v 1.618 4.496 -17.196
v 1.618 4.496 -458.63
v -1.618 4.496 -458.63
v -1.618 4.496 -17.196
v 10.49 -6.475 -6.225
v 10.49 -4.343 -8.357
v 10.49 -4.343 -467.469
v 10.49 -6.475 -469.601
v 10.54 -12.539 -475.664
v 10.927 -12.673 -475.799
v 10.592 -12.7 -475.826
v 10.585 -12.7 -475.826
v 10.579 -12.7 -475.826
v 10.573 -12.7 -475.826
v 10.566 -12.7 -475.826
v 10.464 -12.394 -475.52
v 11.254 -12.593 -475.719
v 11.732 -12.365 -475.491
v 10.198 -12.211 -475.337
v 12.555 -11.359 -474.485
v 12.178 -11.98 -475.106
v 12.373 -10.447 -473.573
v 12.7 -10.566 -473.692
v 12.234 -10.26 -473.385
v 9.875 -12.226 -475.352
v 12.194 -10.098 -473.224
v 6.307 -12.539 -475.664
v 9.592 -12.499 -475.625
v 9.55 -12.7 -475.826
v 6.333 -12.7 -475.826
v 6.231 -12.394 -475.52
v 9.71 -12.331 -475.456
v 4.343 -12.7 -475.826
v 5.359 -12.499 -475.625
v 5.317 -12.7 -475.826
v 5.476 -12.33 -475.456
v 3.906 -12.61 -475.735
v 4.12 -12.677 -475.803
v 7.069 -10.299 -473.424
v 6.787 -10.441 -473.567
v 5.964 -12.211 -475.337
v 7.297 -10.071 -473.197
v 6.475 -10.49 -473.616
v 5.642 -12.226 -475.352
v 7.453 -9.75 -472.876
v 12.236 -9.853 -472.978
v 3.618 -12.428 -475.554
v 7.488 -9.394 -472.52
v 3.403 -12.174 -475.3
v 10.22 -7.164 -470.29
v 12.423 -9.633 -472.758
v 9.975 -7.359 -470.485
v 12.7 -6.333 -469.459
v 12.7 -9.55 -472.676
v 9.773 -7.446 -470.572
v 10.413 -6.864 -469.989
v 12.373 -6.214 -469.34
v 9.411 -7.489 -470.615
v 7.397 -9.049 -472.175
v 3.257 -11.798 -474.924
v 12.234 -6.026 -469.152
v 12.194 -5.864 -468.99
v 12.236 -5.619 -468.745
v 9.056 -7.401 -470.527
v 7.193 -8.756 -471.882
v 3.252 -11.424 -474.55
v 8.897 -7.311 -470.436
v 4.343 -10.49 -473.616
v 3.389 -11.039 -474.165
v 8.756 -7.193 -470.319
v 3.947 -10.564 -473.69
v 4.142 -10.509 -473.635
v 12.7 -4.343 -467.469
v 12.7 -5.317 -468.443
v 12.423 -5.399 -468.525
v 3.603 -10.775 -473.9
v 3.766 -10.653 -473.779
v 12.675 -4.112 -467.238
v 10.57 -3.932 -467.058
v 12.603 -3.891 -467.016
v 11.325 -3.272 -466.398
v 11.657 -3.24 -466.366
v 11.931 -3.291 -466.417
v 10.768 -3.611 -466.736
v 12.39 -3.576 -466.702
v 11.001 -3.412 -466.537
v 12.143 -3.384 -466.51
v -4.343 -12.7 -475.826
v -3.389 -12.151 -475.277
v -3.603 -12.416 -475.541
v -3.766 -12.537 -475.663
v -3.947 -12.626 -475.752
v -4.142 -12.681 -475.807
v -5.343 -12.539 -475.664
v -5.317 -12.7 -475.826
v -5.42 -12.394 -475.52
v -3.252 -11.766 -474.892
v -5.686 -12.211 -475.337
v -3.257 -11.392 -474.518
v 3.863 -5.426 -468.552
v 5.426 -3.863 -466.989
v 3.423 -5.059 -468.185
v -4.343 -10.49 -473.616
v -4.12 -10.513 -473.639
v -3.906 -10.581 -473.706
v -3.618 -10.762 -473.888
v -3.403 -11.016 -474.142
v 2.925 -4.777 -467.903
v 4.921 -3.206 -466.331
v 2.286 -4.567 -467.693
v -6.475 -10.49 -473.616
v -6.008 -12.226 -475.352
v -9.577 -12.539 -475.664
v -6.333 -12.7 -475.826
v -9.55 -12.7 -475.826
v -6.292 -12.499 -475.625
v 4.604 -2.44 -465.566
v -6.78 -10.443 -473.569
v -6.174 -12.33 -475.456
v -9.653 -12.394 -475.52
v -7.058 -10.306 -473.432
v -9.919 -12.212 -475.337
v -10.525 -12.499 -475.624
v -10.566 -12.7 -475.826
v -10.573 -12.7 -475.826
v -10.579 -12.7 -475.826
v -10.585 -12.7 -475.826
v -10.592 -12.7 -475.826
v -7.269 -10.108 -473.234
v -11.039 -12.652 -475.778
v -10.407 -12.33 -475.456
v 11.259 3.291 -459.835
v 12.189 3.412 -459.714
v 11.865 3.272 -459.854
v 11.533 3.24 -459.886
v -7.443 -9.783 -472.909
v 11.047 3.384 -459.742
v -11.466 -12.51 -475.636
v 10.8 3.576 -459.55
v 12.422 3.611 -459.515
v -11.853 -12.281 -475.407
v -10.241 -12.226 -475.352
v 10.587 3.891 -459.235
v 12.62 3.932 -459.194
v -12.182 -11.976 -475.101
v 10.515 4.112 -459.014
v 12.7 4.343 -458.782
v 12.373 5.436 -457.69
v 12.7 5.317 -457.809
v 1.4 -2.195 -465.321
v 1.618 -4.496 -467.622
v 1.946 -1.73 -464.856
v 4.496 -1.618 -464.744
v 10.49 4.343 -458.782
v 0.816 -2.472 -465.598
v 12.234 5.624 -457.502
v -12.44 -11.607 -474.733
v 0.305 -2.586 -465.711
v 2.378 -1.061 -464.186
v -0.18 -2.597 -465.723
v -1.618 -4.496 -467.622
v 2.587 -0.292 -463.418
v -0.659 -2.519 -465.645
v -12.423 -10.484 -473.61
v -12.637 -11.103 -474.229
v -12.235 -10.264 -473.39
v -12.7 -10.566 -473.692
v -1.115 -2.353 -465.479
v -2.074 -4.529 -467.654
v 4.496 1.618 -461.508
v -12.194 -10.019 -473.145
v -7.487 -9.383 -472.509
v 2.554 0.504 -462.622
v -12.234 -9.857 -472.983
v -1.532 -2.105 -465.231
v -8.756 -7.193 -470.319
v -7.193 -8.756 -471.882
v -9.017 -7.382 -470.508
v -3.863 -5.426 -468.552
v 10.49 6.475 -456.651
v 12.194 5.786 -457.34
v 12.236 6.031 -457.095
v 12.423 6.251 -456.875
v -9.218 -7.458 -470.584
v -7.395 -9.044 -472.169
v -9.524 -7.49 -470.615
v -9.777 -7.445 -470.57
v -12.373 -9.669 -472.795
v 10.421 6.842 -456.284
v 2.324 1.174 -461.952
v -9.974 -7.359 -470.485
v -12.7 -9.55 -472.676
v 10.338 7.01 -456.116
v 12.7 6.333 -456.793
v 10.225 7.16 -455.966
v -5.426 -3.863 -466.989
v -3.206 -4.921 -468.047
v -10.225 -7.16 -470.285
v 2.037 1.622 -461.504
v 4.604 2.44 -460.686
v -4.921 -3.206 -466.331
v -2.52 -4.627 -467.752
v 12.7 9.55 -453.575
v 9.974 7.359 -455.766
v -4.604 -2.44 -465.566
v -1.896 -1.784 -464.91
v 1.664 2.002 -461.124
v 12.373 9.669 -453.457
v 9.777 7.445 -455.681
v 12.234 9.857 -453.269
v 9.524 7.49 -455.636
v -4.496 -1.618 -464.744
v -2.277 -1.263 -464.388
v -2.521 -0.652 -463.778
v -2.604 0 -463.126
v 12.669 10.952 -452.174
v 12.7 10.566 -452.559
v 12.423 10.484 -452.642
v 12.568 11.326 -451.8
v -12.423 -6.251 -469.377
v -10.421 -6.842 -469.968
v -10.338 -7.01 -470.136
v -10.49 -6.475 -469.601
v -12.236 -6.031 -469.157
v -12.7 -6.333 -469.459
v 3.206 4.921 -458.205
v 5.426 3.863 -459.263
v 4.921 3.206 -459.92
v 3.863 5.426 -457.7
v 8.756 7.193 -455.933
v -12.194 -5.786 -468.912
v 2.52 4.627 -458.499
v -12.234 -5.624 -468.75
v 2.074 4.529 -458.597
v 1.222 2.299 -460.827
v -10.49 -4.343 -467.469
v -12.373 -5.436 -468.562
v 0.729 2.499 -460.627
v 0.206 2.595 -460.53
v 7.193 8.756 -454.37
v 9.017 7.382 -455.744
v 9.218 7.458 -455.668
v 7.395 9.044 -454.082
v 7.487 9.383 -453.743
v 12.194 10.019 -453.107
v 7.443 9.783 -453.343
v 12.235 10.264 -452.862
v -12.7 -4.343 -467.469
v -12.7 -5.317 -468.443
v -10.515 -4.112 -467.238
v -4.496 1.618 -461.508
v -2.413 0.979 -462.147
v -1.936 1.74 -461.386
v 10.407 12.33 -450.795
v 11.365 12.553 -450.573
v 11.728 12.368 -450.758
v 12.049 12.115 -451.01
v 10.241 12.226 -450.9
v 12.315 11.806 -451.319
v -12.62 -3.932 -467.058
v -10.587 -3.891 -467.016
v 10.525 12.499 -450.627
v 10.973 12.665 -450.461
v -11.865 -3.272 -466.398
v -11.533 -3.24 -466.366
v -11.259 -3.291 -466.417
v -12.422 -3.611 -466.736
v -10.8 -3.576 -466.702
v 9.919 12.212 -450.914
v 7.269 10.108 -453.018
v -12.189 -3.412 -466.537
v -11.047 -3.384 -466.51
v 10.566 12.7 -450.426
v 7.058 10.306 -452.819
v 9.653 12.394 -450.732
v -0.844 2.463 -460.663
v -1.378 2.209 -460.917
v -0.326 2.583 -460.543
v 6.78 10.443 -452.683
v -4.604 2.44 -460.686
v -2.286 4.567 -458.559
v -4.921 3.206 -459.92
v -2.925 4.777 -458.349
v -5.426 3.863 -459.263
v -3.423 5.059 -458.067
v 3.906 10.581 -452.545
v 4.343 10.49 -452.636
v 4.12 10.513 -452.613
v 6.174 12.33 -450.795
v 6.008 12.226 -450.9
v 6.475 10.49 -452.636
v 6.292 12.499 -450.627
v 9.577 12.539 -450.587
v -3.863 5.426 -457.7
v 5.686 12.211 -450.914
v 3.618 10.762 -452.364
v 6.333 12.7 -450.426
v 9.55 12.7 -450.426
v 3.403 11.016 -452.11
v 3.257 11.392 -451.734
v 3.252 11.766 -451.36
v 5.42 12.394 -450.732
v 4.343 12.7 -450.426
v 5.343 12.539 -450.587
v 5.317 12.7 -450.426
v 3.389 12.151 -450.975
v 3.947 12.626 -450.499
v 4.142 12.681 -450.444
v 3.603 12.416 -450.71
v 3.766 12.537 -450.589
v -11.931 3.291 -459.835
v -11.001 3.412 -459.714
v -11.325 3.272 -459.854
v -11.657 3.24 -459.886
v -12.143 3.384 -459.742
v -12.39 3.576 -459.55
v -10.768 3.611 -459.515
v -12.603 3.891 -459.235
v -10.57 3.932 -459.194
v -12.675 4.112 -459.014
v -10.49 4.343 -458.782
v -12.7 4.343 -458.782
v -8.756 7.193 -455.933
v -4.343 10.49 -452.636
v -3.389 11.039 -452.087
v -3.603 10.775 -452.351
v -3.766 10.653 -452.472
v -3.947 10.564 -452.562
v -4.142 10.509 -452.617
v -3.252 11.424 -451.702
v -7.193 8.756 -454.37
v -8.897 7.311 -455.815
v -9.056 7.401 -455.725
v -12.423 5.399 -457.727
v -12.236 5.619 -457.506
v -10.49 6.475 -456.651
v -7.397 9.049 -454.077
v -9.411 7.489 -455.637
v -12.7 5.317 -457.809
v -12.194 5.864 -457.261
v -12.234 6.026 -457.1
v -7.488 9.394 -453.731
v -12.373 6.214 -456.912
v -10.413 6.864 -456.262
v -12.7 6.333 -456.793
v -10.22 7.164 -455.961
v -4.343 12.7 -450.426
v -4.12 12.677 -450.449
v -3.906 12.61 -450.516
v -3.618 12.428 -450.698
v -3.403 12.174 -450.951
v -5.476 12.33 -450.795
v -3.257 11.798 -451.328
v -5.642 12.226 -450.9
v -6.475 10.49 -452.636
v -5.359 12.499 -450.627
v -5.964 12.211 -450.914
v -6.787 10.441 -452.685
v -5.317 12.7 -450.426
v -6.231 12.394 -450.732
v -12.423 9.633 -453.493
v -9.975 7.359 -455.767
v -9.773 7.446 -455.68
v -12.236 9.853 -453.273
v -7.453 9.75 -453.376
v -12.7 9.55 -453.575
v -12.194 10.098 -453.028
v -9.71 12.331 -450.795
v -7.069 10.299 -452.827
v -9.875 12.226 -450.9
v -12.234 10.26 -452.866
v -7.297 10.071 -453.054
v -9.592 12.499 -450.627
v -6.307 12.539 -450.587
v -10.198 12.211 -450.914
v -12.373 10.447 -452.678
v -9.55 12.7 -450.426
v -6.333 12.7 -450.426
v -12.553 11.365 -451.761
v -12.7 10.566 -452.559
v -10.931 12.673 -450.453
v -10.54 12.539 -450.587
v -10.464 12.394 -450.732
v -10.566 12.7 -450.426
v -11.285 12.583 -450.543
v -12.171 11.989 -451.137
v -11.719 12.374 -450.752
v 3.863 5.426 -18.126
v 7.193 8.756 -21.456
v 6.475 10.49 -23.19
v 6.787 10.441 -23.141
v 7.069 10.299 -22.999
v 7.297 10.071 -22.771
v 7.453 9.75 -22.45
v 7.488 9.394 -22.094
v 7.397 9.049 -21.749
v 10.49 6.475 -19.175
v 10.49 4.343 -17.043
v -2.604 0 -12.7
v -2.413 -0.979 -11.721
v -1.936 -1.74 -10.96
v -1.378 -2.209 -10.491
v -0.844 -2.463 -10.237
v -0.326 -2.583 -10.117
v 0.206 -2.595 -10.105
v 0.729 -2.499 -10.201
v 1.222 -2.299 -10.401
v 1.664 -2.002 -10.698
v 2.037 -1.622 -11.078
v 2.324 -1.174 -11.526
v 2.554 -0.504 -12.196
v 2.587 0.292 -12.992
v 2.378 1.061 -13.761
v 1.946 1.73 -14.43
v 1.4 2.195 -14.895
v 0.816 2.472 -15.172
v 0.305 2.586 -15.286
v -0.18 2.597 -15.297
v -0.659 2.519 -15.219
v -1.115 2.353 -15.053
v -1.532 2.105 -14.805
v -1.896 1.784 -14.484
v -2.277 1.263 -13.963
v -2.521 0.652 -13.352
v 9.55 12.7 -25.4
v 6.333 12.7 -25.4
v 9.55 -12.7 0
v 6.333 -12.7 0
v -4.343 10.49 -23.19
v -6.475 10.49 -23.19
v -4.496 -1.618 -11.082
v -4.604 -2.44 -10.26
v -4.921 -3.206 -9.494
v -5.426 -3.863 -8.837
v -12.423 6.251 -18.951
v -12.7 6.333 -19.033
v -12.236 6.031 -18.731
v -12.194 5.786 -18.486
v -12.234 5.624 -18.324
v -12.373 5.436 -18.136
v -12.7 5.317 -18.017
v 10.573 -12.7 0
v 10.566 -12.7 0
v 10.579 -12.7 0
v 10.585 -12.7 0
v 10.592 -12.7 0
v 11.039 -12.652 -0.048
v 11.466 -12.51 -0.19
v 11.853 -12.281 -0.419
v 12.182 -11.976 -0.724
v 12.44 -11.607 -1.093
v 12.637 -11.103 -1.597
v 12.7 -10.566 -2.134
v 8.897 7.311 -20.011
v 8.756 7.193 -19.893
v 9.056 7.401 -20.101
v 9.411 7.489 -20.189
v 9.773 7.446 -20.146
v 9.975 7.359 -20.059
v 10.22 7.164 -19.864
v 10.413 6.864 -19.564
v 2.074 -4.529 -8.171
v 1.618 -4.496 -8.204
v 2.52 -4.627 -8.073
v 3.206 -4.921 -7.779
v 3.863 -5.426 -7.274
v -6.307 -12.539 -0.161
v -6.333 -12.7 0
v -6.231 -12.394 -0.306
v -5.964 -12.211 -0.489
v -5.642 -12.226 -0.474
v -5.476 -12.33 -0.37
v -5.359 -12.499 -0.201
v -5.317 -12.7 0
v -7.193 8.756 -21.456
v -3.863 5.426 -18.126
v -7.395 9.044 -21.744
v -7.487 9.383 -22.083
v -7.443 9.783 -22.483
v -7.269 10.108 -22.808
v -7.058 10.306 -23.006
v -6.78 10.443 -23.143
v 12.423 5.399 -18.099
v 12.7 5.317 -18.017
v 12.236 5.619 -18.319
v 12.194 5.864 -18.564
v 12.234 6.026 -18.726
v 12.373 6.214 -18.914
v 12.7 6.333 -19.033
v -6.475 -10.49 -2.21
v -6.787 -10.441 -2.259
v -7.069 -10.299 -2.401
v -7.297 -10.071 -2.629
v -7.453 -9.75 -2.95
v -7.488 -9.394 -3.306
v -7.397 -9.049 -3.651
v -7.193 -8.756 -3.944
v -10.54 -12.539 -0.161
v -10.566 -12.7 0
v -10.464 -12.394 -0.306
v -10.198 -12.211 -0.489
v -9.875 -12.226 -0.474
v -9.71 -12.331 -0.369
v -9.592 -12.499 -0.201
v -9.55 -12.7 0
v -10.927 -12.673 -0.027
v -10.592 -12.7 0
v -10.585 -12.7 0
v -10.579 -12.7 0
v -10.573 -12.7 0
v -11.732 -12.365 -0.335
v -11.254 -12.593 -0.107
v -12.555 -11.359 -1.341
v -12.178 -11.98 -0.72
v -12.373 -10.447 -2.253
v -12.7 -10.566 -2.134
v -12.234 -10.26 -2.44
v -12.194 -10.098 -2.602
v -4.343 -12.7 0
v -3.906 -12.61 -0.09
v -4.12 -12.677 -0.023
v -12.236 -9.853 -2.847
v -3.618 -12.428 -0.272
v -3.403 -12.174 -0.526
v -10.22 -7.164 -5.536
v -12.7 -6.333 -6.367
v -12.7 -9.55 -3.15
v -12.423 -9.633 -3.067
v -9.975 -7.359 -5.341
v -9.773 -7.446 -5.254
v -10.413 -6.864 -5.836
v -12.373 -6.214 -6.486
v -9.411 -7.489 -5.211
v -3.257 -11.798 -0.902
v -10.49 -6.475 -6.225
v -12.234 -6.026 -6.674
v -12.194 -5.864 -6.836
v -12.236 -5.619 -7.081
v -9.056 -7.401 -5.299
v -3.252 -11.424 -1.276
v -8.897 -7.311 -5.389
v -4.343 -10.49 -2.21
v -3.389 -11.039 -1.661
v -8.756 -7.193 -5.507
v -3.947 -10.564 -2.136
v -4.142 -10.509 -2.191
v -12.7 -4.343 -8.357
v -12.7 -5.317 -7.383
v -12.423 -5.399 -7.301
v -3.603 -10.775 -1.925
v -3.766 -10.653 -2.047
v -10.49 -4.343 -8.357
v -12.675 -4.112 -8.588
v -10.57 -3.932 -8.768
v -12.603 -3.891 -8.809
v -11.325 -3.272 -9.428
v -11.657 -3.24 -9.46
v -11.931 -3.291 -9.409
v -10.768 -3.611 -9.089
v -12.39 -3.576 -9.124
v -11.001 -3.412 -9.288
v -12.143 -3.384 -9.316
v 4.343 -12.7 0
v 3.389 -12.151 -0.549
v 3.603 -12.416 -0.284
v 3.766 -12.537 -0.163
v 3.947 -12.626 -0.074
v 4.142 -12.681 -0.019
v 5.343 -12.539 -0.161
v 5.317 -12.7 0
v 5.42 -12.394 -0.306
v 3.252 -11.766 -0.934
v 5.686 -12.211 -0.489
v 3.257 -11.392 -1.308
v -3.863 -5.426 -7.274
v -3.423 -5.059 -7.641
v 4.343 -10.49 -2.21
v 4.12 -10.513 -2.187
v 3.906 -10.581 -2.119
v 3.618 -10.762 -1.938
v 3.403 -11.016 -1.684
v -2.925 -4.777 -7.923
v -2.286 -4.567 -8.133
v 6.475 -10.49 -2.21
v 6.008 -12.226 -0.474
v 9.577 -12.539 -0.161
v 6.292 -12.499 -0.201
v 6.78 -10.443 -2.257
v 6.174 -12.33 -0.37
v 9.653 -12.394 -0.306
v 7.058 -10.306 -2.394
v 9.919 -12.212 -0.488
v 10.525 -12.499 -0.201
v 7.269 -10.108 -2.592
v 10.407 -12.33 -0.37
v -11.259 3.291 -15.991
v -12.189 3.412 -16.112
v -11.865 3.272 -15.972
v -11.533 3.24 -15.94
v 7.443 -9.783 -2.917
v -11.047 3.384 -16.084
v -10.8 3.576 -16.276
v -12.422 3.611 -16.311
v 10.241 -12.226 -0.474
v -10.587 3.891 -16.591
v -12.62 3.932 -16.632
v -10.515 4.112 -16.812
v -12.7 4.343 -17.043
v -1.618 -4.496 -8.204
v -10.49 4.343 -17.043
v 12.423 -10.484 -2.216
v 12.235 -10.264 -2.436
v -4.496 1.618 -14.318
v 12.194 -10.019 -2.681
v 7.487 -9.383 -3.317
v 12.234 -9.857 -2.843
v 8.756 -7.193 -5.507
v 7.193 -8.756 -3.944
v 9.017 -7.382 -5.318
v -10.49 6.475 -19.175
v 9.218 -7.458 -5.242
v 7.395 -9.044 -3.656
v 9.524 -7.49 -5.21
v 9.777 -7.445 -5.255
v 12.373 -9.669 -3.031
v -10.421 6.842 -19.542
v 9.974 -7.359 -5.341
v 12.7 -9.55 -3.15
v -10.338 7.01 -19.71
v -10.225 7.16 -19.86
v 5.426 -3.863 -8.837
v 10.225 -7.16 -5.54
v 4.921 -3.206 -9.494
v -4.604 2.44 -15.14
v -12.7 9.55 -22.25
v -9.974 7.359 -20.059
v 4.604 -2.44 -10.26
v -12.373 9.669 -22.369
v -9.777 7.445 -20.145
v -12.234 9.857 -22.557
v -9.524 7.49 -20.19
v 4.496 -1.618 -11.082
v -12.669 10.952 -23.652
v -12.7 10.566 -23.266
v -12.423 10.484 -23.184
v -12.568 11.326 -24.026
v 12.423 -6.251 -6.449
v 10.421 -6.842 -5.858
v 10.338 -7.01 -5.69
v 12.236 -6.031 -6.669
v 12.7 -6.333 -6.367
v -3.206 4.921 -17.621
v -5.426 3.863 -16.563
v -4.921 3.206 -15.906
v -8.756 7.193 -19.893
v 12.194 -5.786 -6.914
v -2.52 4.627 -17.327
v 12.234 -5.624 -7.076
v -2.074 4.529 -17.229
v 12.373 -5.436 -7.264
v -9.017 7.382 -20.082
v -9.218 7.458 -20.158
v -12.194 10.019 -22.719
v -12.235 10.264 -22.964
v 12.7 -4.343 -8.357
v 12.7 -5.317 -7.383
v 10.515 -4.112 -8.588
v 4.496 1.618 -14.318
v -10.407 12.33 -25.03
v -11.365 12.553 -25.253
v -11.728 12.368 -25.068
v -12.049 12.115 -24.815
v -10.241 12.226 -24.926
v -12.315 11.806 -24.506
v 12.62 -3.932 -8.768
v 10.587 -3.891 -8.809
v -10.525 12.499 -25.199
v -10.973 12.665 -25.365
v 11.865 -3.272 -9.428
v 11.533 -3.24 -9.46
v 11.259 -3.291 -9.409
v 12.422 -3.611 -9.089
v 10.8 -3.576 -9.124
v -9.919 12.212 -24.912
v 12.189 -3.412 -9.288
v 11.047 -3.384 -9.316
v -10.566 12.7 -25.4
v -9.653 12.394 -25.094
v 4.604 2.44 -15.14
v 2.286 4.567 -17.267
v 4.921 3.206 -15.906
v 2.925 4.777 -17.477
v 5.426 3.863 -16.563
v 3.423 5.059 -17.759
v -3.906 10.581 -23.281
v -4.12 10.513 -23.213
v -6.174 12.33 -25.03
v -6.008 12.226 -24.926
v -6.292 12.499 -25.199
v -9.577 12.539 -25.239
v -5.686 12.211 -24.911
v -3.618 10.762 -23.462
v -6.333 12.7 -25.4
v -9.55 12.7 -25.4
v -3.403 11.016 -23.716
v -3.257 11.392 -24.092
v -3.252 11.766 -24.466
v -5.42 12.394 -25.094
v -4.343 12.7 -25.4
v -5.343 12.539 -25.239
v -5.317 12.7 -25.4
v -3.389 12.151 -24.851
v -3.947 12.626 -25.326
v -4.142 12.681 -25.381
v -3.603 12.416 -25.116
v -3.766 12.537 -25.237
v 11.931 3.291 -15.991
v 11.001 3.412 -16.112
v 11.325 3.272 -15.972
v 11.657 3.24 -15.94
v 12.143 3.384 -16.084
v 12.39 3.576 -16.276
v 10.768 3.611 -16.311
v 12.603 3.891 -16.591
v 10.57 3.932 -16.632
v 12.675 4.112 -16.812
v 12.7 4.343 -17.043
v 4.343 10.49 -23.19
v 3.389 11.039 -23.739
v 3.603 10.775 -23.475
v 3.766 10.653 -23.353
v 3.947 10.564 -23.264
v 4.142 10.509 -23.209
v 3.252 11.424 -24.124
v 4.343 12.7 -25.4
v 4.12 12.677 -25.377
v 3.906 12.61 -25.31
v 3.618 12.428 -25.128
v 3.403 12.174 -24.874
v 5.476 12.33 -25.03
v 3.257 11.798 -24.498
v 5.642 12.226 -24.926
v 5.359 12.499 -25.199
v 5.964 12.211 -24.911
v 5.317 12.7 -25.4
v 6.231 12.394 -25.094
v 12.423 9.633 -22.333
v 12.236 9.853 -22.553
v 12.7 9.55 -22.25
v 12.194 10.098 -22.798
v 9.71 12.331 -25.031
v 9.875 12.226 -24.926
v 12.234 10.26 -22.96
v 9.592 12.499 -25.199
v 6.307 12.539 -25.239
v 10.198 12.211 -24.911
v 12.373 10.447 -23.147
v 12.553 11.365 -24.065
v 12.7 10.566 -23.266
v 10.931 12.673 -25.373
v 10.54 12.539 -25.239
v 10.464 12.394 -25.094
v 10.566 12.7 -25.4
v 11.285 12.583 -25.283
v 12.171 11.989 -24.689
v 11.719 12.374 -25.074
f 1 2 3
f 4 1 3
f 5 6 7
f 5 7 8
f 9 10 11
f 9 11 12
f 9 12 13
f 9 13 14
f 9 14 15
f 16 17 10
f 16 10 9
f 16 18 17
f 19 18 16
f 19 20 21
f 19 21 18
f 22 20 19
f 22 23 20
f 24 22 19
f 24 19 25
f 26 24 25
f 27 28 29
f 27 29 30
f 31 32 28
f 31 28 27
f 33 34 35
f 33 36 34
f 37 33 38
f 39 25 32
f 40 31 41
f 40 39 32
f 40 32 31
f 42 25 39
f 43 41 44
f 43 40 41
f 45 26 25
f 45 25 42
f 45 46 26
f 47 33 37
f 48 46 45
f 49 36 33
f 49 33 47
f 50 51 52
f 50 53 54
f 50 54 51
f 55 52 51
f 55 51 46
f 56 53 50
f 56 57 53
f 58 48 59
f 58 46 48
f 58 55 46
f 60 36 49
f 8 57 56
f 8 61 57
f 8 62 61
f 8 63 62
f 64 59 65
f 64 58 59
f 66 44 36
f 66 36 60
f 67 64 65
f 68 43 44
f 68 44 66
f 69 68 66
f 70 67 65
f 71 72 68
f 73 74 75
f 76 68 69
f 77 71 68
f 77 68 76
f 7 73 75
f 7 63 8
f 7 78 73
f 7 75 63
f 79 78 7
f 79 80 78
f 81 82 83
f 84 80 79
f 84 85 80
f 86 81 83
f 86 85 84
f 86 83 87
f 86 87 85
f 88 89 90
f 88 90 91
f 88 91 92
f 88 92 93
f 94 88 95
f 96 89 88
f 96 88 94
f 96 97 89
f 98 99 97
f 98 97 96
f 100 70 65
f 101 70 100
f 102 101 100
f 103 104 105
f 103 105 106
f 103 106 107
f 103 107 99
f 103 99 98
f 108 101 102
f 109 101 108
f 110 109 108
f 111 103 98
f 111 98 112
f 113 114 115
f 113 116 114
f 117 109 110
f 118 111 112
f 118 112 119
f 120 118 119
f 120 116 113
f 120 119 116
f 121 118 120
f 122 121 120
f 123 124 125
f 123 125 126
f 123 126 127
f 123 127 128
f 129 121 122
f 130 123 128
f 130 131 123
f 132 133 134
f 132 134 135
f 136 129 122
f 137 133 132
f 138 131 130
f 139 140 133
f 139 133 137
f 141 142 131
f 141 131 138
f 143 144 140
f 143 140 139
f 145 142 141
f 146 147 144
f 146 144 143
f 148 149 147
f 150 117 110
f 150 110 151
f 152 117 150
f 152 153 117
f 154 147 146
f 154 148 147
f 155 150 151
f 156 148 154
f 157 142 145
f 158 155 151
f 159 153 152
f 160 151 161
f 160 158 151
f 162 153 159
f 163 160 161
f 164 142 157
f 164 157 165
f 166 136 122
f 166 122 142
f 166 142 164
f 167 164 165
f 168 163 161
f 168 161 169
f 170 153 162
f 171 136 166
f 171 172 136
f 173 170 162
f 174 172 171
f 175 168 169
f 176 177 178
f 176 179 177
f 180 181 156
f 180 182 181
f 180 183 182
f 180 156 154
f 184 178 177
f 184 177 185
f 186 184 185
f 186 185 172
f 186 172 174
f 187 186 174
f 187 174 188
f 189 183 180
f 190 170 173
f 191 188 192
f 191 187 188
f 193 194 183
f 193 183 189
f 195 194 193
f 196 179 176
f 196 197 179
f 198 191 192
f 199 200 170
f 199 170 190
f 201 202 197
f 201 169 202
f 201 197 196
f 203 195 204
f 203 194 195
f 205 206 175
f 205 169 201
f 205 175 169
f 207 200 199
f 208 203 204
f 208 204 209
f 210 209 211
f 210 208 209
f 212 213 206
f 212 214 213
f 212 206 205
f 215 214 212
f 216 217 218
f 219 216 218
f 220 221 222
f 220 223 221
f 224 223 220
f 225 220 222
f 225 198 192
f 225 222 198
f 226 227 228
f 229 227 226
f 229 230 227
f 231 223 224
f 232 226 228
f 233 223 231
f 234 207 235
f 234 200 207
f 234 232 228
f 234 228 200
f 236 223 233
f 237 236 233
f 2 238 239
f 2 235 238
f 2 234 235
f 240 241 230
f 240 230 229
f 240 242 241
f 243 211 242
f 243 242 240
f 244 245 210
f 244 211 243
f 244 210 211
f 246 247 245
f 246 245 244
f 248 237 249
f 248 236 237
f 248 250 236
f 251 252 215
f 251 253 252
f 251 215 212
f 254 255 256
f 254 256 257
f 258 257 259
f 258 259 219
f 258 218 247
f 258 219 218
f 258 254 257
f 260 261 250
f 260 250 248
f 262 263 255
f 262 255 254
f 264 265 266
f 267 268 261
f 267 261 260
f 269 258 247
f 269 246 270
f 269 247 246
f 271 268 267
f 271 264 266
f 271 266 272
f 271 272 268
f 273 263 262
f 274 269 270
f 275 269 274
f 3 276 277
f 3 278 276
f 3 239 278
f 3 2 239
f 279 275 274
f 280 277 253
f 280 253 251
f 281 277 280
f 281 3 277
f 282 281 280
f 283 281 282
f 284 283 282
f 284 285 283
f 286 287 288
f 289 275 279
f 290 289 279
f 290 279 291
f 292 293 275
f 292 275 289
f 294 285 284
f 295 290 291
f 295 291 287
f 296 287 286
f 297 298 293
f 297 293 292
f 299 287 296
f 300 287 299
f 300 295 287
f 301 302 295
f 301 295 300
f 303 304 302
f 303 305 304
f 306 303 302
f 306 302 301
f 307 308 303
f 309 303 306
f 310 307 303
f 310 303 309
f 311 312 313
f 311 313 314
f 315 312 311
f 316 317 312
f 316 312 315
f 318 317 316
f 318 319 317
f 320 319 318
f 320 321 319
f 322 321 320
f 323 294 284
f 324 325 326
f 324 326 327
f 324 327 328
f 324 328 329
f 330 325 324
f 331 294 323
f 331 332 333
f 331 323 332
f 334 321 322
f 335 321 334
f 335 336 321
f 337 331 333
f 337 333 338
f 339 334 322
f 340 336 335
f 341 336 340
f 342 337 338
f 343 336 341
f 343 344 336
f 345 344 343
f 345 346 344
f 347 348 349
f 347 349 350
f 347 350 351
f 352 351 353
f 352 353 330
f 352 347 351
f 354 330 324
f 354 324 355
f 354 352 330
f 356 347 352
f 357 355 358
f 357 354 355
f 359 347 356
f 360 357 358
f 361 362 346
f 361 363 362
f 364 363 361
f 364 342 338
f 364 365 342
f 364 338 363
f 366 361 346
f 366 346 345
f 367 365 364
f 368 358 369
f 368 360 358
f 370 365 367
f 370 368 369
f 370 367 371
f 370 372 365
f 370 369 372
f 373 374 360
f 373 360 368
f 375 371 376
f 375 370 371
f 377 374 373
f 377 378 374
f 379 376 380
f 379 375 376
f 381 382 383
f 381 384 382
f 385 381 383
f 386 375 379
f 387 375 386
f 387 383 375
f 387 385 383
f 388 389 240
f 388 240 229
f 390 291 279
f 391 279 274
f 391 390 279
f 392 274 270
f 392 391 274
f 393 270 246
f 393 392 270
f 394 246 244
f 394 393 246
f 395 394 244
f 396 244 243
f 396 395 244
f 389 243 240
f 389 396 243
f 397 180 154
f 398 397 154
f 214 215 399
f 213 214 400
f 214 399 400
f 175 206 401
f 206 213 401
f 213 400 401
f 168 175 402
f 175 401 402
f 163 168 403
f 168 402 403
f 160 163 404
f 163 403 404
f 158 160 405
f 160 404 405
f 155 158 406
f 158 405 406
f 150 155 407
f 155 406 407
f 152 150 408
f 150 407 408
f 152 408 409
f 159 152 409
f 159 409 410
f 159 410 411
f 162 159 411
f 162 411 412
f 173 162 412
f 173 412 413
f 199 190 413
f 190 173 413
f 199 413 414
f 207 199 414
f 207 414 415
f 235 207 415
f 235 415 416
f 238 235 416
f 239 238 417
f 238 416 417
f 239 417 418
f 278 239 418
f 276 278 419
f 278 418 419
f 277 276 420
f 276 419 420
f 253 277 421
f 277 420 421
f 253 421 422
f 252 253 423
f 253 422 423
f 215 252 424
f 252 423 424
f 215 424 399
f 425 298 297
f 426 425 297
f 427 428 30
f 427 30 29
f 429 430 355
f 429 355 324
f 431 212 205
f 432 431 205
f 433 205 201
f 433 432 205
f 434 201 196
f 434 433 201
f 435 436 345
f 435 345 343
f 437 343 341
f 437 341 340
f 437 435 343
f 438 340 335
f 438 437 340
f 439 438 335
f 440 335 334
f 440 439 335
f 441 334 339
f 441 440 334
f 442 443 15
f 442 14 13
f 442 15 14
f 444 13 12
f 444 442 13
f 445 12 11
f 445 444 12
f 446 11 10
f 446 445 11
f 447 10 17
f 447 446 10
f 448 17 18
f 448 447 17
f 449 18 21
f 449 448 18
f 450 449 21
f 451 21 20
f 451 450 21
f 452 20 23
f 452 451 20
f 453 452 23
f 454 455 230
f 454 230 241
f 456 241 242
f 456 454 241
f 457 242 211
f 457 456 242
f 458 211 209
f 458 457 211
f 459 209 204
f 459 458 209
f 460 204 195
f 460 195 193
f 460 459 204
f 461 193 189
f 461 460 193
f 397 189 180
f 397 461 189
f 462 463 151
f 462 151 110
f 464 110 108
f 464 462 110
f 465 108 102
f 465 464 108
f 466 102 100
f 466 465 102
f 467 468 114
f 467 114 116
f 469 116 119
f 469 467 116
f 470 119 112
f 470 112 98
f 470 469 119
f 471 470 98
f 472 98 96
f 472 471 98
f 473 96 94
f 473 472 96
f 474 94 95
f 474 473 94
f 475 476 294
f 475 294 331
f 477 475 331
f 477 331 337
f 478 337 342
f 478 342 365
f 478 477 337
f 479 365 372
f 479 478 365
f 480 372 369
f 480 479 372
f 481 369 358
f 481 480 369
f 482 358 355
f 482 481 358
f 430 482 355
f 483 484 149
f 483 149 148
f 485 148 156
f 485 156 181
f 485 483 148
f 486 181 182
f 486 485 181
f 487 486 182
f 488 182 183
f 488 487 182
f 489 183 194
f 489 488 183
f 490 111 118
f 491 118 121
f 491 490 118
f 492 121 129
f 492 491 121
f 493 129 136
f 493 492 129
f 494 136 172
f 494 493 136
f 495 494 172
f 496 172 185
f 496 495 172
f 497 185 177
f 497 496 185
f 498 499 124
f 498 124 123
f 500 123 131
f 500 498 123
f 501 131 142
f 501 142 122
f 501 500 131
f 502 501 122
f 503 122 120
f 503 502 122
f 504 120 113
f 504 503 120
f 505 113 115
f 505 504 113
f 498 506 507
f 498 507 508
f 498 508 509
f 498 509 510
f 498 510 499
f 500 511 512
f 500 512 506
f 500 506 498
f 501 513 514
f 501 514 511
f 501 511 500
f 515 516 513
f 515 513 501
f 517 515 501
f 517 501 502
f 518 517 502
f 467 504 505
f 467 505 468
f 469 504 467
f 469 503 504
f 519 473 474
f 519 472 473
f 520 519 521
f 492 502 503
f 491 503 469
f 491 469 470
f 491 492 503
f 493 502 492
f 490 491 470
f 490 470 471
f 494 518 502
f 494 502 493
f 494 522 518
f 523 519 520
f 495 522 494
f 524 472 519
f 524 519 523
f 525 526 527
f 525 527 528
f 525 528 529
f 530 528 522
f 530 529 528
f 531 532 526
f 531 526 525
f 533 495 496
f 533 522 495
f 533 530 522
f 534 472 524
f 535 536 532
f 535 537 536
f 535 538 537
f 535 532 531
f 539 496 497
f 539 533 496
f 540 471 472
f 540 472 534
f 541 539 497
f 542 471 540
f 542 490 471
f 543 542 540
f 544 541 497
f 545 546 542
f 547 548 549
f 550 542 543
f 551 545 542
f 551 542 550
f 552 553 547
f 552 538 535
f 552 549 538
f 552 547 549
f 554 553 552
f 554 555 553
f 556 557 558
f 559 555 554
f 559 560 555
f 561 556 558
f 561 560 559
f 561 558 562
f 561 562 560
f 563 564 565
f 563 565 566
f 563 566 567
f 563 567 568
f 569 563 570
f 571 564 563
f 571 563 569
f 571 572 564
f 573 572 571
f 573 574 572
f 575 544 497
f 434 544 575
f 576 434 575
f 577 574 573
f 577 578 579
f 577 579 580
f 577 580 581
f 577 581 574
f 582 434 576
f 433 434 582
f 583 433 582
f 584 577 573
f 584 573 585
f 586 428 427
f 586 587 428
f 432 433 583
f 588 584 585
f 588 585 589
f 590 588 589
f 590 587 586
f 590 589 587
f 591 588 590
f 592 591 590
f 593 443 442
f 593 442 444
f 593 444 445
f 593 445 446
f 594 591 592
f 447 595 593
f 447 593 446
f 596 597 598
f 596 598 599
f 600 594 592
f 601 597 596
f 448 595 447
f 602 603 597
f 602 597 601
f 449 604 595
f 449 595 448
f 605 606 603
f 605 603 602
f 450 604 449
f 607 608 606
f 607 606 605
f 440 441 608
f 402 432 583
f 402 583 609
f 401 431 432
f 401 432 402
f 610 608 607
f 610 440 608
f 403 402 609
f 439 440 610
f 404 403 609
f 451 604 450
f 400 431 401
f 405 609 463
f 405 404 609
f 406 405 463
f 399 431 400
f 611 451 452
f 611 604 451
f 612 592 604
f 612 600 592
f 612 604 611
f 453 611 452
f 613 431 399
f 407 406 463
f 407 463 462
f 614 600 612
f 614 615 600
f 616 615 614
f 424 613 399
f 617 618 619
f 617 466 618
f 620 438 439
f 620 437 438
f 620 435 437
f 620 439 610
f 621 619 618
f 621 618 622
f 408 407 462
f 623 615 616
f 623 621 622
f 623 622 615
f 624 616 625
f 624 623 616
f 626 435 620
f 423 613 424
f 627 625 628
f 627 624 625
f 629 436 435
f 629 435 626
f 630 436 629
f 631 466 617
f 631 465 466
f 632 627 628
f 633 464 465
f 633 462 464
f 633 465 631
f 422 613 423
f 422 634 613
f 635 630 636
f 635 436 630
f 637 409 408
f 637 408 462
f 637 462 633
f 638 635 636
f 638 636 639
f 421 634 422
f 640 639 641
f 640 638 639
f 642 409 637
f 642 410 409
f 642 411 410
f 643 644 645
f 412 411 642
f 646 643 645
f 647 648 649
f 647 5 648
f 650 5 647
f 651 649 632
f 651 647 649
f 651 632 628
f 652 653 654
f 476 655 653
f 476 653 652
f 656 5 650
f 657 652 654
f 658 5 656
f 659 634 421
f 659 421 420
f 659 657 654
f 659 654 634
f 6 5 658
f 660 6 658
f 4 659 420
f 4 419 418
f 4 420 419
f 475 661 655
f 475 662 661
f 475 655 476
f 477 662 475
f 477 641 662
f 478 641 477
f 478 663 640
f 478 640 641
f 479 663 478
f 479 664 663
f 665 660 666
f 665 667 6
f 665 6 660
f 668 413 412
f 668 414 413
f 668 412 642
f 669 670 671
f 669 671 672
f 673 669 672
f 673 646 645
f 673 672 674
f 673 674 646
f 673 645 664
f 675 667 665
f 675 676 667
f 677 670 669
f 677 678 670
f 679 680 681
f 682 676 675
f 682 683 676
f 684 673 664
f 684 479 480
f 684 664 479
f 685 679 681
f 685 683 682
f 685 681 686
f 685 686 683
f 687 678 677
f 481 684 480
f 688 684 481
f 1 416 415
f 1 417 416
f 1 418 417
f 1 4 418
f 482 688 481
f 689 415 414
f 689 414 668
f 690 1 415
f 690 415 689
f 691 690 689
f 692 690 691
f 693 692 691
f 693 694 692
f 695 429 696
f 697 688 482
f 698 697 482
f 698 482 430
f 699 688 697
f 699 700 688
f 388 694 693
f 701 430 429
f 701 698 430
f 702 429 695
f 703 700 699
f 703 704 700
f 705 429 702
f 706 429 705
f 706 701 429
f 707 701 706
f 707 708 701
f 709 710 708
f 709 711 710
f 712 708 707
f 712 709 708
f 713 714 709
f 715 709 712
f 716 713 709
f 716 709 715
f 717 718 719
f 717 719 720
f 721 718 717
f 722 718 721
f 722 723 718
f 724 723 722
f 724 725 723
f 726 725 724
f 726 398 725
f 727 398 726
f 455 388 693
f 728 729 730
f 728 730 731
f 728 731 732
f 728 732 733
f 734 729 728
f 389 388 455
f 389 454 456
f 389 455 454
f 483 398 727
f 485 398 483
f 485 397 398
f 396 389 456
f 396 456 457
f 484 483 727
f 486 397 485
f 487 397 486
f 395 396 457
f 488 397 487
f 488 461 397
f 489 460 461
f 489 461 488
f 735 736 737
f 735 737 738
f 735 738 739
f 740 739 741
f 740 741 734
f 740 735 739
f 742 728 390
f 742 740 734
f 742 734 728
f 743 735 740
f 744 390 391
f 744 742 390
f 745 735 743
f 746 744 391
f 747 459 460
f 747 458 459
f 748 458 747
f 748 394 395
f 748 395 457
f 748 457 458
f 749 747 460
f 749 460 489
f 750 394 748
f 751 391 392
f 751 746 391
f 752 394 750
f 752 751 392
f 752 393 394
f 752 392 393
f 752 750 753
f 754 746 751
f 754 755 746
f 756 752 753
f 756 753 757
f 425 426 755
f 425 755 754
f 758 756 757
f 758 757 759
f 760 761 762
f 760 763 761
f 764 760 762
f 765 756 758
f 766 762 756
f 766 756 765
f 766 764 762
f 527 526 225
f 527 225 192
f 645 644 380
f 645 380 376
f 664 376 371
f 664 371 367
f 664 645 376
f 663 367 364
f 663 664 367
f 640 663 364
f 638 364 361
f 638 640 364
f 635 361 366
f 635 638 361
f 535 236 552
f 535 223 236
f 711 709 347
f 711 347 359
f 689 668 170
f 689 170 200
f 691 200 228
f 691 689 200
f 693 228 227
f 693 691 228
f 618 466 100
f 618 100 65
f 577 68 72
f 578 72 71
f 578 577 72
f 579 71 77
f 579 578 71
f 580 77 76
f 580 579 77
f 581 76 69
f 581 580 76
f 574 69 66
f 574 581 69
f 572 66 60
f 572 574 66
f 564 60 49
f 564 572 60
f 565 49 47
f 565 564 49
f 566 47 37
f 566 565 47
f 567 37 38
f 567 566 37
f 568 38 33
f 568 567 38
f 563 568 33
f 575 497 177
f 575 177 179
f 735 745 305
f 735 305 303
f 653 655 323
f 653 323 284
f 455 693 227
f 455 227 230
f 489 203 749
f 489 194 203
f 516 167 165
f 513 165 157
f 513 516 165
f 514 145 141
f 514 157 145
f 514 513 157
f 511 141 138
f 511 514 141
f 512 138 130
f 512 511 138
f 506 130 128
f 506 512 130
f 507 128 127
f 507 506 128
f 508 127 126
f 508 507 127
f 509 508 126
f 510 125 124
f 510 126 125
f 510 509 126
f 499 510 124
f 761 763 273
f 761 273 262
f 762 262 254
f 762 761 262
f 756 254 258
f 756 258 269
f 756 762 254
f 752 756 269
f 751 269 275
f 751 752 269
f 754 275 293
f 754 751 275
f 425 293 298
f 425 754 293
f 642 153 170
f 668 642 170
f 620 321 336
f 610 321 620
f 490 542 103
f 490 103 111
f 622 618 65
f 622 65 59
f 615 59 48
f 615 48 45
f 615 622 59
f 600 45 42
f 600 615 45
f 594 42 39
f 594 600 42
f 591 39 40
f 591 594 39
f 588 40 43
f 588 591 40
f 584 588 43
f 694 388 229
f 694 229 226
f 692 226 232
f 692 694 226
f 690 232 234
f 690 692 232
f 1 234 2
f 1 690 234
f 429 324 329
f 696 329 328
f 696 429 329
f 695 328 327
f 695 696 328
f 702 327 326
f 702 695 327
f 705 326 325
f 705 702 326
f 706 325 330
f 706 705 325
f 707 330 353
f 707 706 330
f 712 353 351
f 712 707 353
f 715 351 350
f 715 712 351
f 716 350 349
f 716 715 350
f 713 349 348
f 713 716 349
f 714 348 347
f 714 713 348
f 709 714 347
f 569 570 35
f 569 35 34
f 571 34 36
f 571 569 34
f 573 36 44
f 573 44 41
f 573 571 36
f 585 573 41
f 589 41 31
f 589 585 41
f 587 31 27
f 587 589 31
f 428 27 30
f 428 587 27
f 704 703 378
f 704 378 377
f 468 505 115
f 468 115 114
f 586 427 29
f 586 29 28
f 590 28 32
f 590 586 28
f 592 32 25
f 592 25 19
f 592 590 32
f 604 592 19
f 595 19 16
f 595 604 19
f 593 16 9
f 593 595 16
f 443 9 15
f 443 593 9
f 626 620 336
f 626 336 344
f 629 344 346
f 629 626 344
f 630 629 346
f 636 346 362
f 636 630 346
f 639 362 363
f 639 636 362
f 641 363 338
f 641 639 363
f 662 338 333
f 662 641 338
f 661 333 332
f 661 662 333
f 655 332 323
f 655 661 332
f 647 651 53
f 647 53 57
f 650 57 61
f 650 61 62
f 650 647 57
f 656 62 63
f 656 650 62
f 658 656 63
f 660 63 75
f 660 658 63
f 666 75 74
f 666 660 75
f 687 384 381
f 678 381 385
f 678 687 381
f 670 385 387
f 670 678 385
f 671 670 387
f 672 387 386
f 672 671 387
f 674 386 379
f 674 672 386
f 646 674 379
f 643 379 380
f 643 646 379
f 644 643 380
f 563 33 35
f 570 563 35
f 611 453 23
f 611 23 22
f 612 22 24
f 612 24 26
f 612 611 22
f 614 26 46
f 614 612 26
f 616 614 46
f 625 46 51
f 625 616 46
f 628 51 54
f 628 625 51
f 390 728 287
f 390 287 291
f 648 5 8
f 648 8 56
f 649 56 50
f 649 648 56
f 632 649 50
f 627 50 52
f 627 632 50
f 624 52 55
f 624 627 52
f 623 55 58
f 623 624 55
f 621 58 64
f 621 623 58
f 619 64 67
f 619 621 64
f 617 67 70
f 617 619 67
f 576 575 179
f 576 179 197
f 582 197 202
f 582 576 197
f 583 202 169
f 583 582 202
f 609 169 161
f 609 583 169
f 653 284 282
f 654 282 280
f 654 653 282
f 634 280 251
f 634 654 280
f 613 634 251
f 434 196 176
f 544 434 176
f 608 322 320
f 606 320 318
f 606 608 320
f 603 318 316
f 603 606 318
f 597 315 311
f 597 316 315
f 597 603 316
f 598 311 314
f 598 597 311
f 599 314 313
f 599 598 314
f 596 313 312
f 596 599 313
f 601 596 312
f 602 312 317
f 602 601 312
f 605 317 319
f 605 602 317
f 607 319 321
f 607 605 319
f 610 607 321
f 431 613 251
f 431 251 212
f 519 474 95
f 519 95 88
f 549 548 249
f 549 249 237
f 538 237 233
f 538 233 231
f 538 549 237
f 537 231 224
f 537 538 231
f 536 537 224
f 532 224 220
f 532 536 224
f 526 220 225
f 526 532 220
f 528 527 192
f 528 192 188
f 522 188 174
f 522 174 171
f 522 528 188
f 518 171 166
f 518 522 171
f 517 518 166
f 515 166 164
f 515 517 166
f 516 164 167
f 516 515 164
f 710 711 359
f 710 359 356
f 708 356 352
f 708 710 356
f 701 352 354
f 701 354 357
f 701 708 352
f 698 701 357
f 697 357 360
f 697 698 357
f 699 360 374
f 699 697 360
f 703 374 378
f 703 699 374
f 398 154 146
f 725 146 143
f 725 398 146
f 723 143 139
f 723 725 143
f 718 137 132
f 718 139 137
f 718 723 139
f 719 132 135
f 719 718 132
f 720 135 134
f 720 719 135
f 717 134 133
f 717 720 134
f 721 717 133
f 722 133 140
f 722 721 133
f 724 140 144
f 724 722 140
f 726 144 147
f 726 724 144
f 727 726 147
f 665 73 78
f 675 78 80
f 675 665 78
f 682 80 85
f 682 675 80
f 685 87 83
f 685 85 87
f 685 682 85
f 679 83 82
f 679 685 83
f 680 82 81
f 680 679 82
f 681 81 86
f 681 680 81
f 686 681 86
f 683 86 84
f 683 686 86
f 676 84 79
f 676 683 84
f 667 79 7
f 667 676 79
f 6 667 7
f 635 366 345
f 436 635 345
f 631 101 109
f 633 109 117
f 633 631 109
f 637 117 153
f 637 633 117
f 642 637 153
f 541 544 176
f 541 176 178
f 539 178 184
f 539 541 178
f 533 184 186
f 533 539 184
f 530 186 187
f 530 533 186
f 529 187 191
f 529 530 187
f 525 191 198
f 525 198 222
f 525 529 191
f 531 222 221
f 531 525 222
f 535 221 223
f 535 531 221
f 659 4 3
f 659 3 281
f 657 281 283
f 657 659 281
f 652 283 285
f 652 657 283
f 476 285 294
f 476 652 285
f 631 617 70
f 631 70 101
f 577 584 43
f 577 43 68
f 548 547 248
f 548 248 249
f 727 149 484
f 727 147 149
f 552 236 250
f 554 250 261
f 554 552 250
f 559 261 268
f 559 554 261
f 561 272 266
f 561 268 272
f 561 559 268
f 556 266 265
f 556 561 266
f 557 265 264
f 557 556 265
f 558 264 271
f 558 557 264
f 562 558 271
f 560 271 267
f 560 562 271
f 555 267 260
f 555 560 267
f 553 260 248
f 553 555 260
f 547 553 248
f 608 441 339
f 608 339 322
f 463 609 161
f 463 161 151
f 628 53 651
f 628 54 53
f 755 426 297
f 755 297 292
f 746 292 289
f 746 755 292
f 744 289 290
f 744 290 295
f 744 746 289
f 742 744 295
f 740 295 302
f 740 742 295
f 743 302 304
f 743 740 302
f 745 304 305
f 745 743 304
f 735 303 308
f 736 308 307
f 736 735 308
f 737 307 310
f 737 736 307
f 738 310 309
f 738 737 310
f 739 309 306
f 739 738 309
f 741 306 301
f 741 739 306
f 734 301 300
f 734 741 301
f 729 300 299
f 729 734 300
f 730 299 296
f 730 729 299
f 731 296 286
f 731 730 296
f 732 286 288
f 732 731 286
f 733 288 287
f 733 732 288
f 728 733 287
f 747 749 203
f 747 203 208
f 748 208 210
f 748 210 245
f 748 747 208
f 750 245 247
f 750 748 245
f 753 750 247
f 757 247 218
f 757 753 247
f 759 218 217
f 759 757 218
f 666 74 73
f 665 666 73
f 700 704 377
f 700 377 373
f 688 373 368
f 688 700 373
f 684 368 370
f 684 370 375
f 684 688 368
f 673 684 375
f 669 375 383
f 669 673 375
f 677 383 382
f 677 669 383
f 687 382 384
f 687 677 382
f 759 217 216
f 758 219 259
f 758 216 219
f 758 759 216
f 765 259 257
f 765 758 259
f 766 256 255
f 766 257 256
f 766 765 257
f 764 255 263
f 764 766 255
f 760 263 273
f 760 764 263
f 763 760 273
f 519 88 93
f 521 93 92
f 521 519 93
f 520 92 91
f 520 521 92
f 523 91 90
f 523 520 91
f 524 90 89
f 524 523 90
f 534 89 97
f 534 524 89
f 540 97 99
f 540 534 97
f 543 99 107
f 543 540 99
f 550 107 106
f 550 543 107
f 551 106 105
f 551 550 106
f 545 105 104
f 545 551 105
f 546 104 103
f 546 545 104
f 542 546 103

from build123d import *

# Parameters (mm, degrees)
SKETCH1_R           = 2.6035
BOSS_EXTRUDE1_DEPTH = 475.82582
SKETCH2_W           = 64.104709227
SKETCH2_H           = 106.42431428
CUT_EXTRUDE1_DEPTH  = 27.94
SKETCH3_W           = 131.394745622
SKETCH3_H           = 146.966910197
CUT_EXTRUDE2_DEPTH  = 24.638


with BuildPart() as part:
    # Sketch1 → Boss-Extrude1 (new body)
    with BuildSketch(Plane.XY):
        with BuildLine():
            Line((-12.7, -6.3330836), (-12.7, -9.5504))
            ThreePointArc((-12.7, -9.5504), (-12.192000006, -10.058323491), (-12.699846982, -10.566399977))
            ThreePointArc((-12.699846982, -10.566399977), (-12.082522516, -12.082522516), (-10.566399977, -12.699846982))
            ThreePointArc((-10.566399977, -12.699846982), (-10.058323491, -12.192000006), (-9.5504, -12.7))
            Line((-9.5504, -12.7), (-6.3330836, -12.7))
            ThreePointArc((-6.3330836, -12.7), (-5.8250836, -12.192), (-5.3170836, -12.7))
            Line((-5.3170836, -12.7), (-4.343399971, -12.7))
            ThreePointArc((-4.343399971, -12.7), (-3.238499971, -11.5951), (-4.343399971, -10.4902))
            Line((-4.343399971, -10.4902), (-6.474794456, -10.4902))
            ThreePointArc((-6.474794456, -10.4902), (-7.413456061, -9.863006367), (-7.193214945, -8.75577951))
            Line((-7.193214945, -8.75577951), (-3.863171405, -5.42573597))
            ThreePointArc((-3.863171405, -5.42573597), (-2.833127272, -4.737482484), (-1.618107374, -4.4958))
            Line((-1.618107374, -4.4958), (1.618107374, -4.4958))
            ThreePointArc((1.618107374, -4.4958), (2.833127272, -4.737482484), (3.863171405, -5.42573597))
            Line((3.863171405, -5.42573597), (7.193214945, -8.75577951))
            ThreePointArc((7.193214945, -8.75577951), (7.413456061, -9.863006367), (6.474794456, -10.4902))
            Line((6.474794456, -10.4902), (4.3434, -10.4902))
            ThreePointArc((4.3434, -10.4902), (3.2385, -11.5951), (4.3434, -12.7))
            Line((4.3434, -12.7), (5.3170836, -12.7))
            ThreePointArc((5.3170836, -12.7), (5.8250836, -12.192), (6.3330836, -12.7))
            Line((6.3330836, -12.7), (9.5504, -12.7))
            ThreePointArc((9.5504, -12.7), (10.058323491, -12.192000006), (10.566399977, -12.699846982))
            ThreePointArc((10.566399977, -12.699846982), (12.082522516, -12.082522516), (12.699846982, -10.566399977))
            ThreePointArc((12.699846982, -10.566399977), (12.192000006, -10.058323491), (12.7, -9.5504))
            Line((12.7, -9.5504), (12.7, -6.3330836))
            ThreePointArc((12.7, -6.3330836), (12.192, -5.8250836), (12.7, -5.3170836))
            Line((12.7, -5.3170836), (12.7, -4.343399971))
            ThreePointArc((12.7, -4.343399971), (11.5951, -3.238499971), (10.4902, -4.343399971))
            Line((10.4902, -4.343399971), (10.4902, -6.474794456))
            ThreePointArc((10.4902, -6.474794456), (9.863006367, -7.413456061), (8.75577951, -7.193214945))
            Line((8.75577951, -7.193214945), (5.42573597, -3.863171405))
            ThreePointArc((5.42573597, -3.863171405), (4.737482484, -2.833127272), (4.4958, -1.618107374))
            Line((4.4958, -1.618107374), (4.4958, 1.618107374))
            ThreePointArc((4.4958, 1.618107374), (4.737482484, 2.833127272), (5.42573597, 3.863171405))
            Line((5.42573597, 3.863171405), (8.75577951, 7.193214945))
            ThreePointArc((8.75577951, 7.193214945), (9.863006367, 7.413456061), (10.4902, 6.474794456))
            Line((10.4902, 6.474794456), (10.4902, 4.3434))
            ThreePointArc((10.4902, 4.3434), (11.5951, 3.2385), (12.7, 4.3434))
            Line((12.7, 4.3434), (12.7, 5.3170836))
            ThreePointArc((12.7, 5.3170836), (12.192, 5.8250836), (12.7, 6.3330836))
            Line((12.7, 6.3330836), (12.7, 9.5504))
            ThreePointArc((12.7, 9.5504), (12.192000006, 10.058323491), (12.699846982, 10.566399977))
            ThreePointArc((12.699846982, 10.566399977), (12.082522516, 12.082522516), (10.566399977, 12.699846982))
            ThreePointArc((10.566399977, 12.699846982), (10.058323491, 12.192000006), (9.5504, 12.7))
            Line((9.5504, 12.7), (6.3330836, 12.7))
            ThreePointArc((6.3330836, 12.7), (5.8250836, 12.192), (5.3170836, 12.7))
            Line((5.3170836, 12.7), (4.343399971, 12.7))
            ThreePointArc((4.343399971, 12.7), (3.238499971, 11.5951), (4.343399971, 10.4902))
            Line((4.343399971, 10.4902), (6.474794456, 10.4902))
            ThreePointArc((6.474794456, 10.4902), (7.413456061, 9.863006367), (7.193214945, 8.75577951))
            Line((7.193214945, 8.75577951), (3.863171405, 5.42573597))
            ThreePointArc((3.863171405, 5.42573597), (2.833127272, 4.737482484), (1.618107374, 4.4958))
            Line((1.618107374, 4.4958), (-1.618107374, 4.4958))
            ThreePointArc((-1.618107374, 4.4958), (-2.833127272, 4.737482484), (-3.863171405, 5.42573597))
            Line((-3.863171405, 5.42573597), (-7.193214945, 8.75577951))
            ThreePointArc((-7.193214945, 8.75577951), (-7.413456061, 9.863006367), (-6.474794456, 10.4902))
            Line((-6.474794456, 10.4902), (-4.3434, 10.4902))
            ThreePointArc((-4.3434, 10.4902), (-3.2385, 11.5951), (-4.3434, 12.7))
            Line((-4.3434, 12.7), (-5.3170836, 12.7))
            ThreePointArc((-5.3170836, 12.7), (-5.8250836, 12.192), (-6.3330836, 12.7))
            Line((-6.3330836, 12.7), (-9.5504, 12.7))
            ThreePointArc((-9.5504, 12.7), (-10.058323491, 12.192000006), (-10.566399977, 12.699846982))
            ThreePointArc((-10.566399977, 12.699846982), (-12.082522516, 12.082522516), (-12.699846982, 10.566399977))
            ThreePointArc((-12.699846982, 10.566399977), (-12.192000006, 10.058323491), (-12.7, 9.5504))
            Line((-12.7, 9.5504), (-12.7, 6.3330836))
            ThreePointArc((-12.7, 6.3330836), (-12.192, 5.8250836), (-12.7, 5.3170836))
            Line((-12.7, 5.3170836), (-12.7, 4.343399971))
            ThreePointArc((-12.7, 4.343399971), (-11.5951, 3.238499971), (-10.4902, 4.343399971))
            Line((-10.4902, 4.343399971), (-10.4902, 6.474794456))
            ThreePointArc((-10.4902, 6.474794456), (-9.863006367, 7.413456061), (-8.75577951, 7.193214945))
            Line((-8.75577951, 7.193214945), (-5.42573597, 3.863171405))
            ThreePointArc((-5.42573597, 3.863171405), (-4.737482484, 2.833127272), (-4.4958, 1.618107374))
            Line((-4.4958, 1.618107374), (-4.4958, -1.618107374))
            ThreePointArc((-4.4958, -1.618107374), (-4.737482484, -2.833127272), (-5.42573597, -3.863171405))
            Line((-5.42573597, -3.863171405), (-8.75577951, -7.193214945))
            ThreePointArc((-8.75577951, -7.193214945), (-9.863006367, -7.413456061), (-10.4902, -6.474794456))
            Line((-10.4902, -6.474794456), (-10.4902, -4.3434))
            ThreePointArc((-10.4902, -4.3434), (-11.5951, -3.2385), (-12.7, -4.3434))
            Line((-12.7, -4.3434), (-12.7, -5.3170836))
            ThreePointArc((-12.7, -5.3170836), (-12.192, -5.8250836), (-12.7, -6.3330836))
        make_face()
        with Locations(Location((0, 0, 0), (0, 0, 180))):
            Circle(SKETCH1_R, mode=Mode.SUBTRACT)
    extrude(amount=-BOSS_EXTRUDE1_DEPTH)

    # Sketch2 → Cut-Extrude1 (cut)
    with BuildSketch(Plane(origin=(0, -6.35, -6.35), x_dir=(1, 0, 0), z_dir=(0, 0.7071067811865475, 0.7071067811865477))):
        with Locations((5.773405489, 36.606923958)):
            Rectangle(SKETCH2_W, SKETCH2_H)
    extrude(amount=CUT_EXTRUDE1_DEPTH, mode=Mode.SUBTRACT)

    # Sketch3 → Cut-Extrude2 (cut)
    with BuildSketch(Plane(origin=(0, 231.56291, -231.56291), x_dir=(-1, 0, 0), z_dir=(0, 0.7071067811865475, -0.7071067811865477))):
        with Locations((23.491787854, -342.928759771)):
            Rectangle(SKETCH3_W, SKETCH3_H)
    extrude(amount=CUT_EXTRUDE2_DEPTH, mode=Mode.SUBTRACT)


solid = part.part
